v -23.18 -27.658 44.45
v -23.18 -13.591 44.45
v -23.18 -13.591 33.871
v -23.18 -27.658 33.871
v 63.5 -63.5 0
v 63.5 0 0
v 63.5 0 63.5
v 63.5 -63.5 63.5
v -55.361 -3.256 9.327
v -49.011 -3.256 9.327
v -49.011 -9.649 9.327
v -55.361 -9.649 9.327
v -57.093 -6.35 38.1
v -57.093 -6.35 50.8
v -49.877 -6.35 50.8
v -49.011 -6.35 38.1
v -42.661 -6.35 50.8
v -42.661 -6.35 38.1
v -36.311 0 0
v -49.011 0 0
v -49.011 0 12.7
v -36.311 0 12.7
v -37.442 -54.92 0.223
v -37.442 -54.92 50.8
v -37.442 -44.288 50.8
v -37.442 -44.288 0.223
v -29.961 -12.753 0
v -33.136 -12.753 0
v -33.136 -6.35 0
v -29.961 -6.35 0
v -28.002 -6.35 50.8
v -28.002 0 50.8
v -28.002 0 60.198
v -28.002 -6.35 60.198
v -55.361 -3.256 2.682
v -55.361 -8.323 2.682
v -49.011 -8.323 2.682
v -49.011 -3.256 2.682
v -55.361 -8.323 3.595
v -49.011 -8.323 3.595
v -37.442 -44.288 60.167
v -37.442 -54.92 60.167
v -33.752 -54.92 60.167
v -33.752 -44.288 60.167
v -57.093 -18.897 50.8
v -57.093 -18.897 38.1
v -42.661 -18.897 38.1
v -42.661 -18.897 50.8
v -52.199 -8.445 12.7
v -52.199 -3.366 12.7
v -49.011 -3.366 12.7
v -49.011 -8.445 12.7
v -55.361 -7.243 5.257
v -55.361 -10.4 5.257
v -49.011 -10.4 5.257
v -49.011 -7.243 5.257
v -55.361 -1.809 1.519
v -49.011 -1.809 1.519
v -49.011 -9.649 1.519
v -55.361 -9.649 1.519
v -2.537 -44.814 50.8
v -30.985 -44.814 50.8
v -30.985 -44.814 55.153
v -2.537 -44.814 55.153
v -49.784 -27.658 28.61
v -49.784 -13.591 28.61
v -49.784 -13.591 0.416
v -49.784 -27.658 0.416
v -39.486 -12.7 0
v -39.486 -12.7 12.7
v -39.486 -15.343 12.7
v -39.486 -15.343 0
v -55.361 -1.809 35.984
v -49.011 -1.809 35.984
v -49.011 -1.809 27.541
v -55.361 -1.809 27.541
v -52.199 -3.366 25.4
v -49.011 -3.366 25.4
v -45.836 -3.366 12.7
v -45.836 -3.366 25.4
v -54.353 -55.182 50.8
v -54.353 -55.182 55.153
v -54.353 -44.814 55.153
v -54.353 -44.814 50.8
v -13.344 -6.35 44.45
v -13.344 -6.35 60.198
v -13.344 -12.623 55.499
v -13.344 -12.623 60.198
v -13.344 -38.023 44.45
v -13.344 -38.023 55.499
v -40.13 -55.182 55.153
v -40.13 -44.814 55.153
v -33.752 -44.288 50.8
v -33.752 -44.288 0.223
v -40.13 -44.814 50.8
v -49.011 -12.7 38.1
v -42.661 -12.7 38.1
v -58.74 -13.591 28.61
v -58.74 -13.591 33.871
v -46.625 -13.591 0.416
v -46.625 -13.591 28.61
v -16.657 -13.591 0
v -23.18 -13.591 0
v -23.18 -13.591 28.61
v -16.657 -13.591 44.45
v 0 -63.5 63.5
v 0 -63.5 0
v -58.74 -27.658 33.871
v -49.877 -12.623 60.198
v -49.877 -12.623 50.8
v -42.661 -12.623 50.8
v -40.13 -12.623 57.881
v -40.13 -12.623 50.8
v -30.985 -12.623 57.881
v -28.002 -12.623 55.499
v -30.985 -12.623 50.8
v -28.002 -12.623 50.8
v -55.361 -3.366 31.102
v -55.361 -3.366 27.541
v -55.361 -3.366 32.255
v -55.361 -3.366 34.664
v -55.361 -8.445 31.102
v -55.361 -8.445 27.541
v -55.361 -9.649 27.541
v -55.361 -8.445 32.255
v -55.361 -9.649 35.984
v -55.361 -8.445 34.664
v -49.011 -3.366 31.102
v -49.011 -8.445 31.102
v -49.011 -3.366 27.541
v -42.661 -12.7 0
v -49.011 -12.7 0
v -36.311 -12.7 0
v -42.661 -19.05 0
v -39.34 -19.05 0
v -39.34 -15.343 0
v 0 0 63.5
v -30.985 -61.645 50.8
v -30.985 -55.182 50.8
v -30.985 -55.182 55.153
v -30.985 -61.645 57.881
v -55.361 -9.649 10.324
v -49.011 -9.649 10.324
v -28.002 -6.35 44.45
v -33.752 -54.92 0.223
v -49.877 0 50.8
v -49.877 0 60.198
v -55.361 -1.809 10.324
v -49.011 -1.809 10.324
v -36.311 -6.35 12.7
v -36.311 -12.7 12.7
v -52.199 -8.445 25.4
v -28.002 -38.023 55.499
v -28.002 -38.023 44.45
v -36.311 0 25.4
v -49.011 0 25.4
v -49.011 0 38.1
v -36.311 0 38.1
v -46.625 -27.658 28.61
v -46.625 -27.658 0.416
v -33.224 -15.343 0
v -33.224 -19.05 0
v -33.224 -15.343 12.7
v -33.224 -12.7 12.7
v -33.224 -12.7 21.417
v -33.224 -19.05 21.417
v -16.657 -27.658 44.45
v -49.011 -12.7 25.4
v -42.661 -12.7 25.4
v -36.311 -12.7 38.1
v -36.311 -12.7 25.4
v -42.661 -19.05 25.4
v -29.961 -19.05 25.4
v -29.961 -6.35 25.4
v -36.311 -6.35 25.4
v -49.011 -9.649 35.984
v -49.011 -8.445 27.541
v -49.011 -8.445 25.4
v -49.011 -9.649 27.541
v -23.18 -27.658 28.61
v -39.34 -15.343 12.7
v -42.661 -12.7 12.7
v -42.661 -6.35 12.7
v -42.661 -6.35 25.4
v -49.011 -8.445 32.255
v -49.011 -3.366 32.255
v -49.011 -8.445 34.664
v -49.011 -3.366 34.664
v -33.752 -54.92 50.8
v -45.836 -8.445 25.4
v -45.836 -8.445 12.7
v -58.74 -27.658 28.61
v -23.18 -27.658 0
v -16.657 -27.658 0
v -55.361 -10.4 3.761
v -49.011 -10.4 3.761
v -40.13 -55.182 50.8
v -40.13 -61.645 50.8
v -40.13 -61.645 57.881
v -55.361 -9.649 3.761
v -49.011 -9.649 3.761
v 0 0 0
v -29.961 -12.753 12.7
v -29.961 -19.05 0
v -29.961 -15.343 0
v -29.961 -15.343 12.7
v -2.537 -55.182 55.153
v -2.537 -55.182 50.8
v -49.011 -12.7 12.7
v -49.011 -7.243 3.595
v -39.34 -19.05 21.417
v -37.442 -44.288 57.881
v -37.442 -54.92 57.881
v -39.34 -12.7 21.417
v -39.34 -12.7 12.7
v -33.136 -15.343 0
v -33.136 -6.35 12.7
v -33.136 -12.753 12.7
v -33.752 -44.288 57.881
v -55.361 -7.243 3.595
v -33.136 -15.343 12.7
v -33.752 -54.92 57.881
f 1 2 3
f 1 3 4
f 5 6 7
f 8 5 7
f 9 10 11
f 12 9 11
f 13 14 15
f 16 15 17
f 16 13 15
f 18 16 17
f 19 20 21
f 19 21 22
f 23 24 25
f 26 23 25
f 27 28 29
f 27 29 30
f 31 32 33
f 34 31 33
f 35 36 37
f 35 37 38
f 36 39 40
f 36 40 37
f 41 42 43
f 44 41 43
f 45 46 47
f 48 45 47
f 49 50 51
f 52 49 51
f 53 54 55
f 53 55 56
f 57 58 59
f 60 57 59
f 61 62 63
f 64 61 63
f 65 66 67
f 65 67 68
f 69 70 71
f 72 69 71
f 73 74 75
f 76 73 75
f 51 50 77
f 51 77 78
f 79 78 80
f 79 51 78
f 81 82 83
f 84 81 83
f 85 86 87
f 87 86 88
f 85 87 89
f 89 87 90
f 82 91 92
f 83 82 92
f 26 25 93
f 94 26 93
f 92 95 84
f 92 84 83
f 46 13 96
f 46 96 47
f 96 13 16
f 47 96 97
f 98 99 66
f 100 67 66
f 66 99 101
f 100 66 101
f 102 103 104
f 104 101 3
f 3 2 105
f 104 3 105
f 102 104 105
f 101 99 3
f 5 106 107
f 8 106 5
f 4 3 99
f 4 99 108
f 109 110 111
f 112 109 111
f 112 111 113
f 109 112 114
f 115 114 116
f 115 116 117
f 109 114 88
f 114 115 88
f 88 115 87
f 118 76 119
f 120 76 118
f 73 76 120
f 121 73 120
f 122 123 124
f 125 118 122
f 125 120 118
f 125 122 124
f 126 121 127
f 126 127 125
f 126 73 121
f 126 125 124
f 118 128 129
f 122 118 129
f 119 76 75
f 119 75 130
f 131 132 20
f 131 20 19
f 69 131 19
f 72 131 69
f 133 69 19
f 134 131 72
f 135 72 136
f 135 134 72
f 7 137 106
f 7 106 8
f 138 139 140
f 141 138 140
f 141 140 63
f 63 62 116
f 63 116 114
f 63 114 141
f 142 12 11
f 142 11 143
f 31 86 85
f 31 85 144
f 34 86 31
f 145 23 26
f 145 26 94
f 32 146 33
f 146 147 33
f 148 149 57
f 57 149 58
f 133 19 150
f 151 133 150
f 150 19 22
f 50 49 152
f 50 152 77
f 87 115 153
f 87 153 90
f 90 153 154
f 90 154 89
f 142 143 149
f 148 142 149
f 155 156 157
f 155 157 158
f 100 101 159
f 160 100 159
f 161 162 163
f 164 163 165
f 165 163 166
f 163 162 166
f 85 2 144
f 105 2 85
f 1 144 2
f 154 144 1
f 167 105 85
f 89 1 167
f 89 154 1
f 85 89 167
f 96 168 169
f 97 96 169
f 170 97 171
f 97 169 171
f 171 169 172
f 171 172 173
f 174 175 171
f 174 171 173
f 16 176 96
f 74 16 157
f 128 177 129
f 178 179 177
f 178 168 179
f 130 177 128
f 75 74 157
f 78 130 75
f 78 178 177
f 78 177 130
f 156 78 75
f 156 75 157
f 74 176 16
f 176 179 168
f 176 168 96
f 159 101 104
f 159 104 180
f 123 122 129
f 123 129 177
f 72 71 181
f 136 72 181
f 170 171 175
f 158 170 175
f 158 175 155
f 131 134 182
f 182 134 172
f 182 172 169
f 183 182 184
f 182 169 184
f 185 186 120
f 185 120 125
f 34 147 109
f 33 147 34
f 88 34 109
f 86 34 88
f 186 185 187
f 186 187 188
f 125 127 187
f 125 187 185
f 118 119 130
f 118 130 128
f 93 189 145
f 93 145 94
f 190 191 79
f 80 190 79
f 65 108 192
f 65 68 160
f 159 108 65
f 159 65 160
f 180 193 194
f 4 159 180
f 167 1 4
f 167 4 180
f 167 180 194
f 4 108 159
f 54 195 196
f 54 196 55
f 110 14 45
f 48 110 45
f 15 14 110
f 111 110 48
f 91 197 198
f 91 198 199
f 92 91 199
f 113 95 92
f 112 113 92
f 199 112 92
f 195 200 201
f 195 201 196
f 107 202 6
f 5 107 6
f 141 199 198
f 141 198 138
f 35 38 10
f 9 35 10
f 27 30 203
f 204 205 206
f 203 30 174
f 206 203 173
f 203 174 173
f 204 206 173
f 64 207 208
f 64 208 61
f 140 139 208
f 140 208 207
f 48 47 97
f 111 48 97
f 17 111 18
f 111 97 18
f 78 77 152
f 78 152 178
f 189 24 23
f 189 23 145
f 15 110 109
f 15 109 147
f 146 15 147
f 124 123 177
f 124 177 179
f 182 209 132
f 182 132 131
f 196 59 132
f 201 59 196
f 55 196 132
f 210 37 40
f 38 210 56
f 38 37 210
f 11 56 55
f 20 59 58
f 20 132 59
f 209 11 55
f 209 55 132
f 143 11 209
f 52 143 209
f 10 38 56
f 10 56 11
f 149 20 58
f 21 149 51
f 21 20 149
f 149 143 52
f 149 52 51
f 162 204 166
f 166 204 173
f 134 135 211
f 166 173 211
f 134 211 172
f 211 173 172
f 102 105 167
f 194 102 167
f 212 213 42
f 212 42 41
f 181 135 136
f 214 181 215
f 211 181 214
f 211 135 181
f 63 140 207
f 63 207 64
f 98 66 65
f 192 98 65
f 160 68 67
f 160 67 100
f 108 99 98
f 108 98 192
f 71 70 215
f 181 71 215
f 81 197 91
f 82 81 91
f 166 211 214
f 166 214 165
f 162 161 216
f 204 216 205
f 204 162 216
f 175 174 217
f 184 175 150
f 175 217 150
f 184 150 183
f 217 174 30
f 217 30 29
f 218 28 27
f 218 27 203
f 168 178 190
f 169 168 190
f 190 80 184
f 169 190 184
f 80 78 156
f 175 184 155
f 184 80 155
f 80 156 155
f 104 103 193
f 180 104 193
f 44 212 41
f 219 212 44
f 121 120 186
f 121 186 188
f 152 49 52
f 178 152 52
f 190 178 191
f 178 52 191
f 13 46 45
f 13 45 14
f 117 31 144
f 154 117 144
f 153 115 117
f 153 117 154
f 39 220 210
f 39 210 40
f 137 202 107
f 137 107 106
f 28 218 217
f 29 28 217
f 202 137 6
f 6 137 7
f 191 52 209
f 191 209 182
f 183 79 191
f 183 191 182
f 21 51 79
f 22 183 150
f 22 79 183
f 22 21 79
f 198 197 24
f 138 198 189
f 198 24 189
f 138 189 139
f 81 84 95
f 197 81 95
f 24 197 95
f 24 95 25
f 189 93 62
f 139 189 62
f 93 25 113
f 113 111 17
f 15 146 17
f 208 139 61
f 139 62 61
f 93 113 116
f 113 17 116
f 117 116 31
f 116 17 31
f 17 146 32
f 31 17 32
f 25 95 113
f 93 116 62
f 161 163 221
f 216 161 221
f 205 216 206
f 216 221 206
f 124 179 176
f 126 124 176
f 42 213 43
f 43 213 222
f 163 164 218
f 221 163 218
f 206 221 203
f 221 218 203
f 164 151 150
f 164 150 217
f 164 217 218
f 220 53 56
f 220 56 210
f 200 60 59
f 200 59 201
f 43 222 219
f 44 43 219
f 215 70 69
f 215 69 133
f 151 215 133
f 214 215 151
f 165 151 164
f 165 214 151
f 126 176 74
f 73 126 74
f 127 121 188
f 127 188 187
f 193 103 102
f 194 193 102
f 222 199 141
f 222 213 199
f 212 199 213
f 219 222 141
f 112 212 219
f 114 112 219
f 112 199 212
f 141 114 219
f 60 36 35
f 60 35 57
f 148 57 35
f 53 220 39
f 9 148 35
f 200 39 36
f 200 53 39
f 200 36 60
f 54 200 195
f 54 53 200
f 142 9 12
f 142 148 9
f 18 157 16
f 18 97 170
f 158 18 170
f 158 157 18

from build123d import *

# Parameters (mm, degrees)
F0_W      = 63.5
F0_H      = 63.5
F1_DEPTH  = 63.5
F2_W      = 12.7
F2_H      = 12.7
F3_DEPTH  = 12.7
F4_W      = 6.35
F4_H      = 6.35
F5_DEPTH  = 12.7
F6_W      = 12.7
F6_H      = 12.7
F7_DEPTH  = 12.7
F8_W      = 6.3622790834
F8_H      = 5.0781101454
F9_DEPTH  = 12.7
F11_DEPTH = 12.7
F12_W     = 6.1163902283
F12_H     = 21.417343989
F13_DEPTH = 6.35
F14_W     = 2.5899494067
F14_H     = 12.7
F15_DEPTH = 6.35
F16_W     = 14.4312972566
F16_H     = 12.5468349248
F17_DEPTH = 12.7
F18_W     = 36.5332050999
F18_H     = 12.6234174624
F19_DEPTH = 9.398
F20_W     = 14.6587782358
F20_H     = 4.699
F21_DEPTH = 25.4
F22_W     = 14.6587782358
F22_H     = 38.0234174624
F23_DEPTH = 6.35
F24_W     = 14.6587782358
F24_H     = 15.748
F25_DEPTH = 6.35
F26_W     = 6.5230224282
F26_H     = 14.0668489039
F27_DEPTH = 44.45
F28_W     = 14.0668489039
F28_H     = 5.2612107247
F29_DEPTH = 35.56
F30_W     = 3.1590871513
F30_H     = 14.0668489039
F31_DEPTH = 28.194
F32_W     = 9.145732969
F32_H     = 7.0805729747
F33_DEPTH = 49.022
F34_W     = 10.367654264
F34_H     = 4.3525428891
F35_DEPTH = 28.448
F36_DEPTH = 23.368
F37_W     = 3.690186888
F37_H     = 10.6312707067
F38_DEPTH = 2.286
F39_DEPTH = 57.658
F40_W     = 5.0781101454
F40_H     = 1.1522667482
F41_DEPTH = 6.35


with BuildPart() as f1:
    # F0 (on Front) → F1 (new body)
    with BuildSketch(Plane.XZ):
        with Locations((31.75, 31.75)):
            Rectangle(F0_W, F0_H)
    extrude(amount=F1_DEPTH)


with BuildPart() as f3:
    # F2 (on Front) → F3 (new body)
    with BuildSketch(Plane.XZ):
        with Locations((-42.6612650613, 6.35)):
            Rectangle(F2_W, F2_H)
    extrude(amount=F3_DEPTH)

    # F4 (on face) → F5 (join)
    with BuildSketch(Plane.XY.offset(12.7)):
        with Locations((-39.4862650613, -9.525)):
            Rectangle(F4_W, F4_H)
        Polygon((-29.9612650613, -6.35), (-36.3112650613, -6.35), (-36.3112650613, -12.7), (-42.6612650613, -12.7), (-42.6612650613, -19.05), (-29.9612650613, -19.05), align=None)
    extrude(amount=F5_DEPTH)

    # F6 (on face) → F7 (join)
    with BuildSketch(Plane.XY.offset(25.4)):
        with Locations((-42.6612650613, -6.35)):
            Rectangle(F6_W, F6_H)
    extrude(amount=F7_DEPTH)

    # F8 (on face) → F9 (join)
    with BuildSketch(Plane.XY.offset(12.7)):
        with Locations((-49.0174046029, -5.9054897865)):
            Rectangle(F8_W, F8_H)
    extrude(amount=F9_DEPTH)

    # F10 (on face) → F11 (join)
    with BuildSketch(Plane(origin=(0, 0, 12.7), x_dir=(1, 0, 0), z_dir=(0, 0, -1))):
        Polygon((-42.6612650613, 12.7), (-39.4862650613, 12.7), (-39.4862650613, 15.3430420905), (-33.1362650613, 15.3430420905), (-33.1362650613, 6.35), (-29.9612650613, 6.35), (-29.9612650613, 19.05), (-42.6612650613, 19.05), align=None)
    extrude(amount=F11_DEPTH)

    # F12 (on face) → F13 (cut)
    with BuildSketch(Plane.XZ.offset(19.05)):
        with Locations((-36.2820141017, 10.7086719945)):
            Rectangle(F12_W, F12_H)
    extrude(amount=-F13_DEPTH, mode=Mode.SUBTRACT)

    # F14 (on face) → F15 (cut)
    with BuildSketch(Plane(origin=(-33.1362650613, 0, 0), x_dir=(0, -1, 0), z_dir=(-1, 0, 0))):
        with Locations((14.0480673872, 6.35)):
            Rectangle(F14_W, F14_H)
    extrude(amount=-F15_DEPTH, mode=Mode.SUBTRACT)

    # F16 (on face) → F17 (join)
    with BuildSketch(Plane.XY.offset(38.1)):
        with Locations((-49.8769136895, -12.6234174624)):
            Rectangle(F16_W, F16_H)
    extrude(amount=F17_DEPTH)

    # F18 (on face) → F19 (join)
    with BuildSketch(Plane.XY.offset(50.8)):
        with Locations((-31.6103111396, -6.3117087312)):
            Rectangle(F18_W, F18_H)
    extrude(amount=F19_DEPTH)

    # F20 (on face) → F21 (join)
    with BuildSketch(Plane.XZ.offset(12.6234174624)):
        with Locations((-20.6730977076, 53.1495)):
            Rectangle(F20_W, F20_H)
    extrude(amount=F21_DEPTH)

    # F22 (on face) → F23 (join)
    with BuildSketch(Plane(origin=(0, 0, 50.8), x_dir=(1, 0, 0), z_dir=(0, 0, -1))):
        with Locations((-20.6730977076, 19.0117087312)):
            Rectangle(F22_W, F22_H)
    extrude(amount=F23_DEPTH)

    # F24 (on face) → F25 (cut)
    with BuildSketch(Plane(origin=(0, 0, 0), x_dir=(-1, 0, 0), z_dir=(0, 1, 0))):
        with Locations((20.6730977076, 52.324)):
            Rectangle(F24_W, F24_H)
    extrude(amount=-F25_DEPTH, mode=Mode.SUBTRACT)

    # F26 (on face) → F27 (join)
    with BuildSketch(Plane(origin=(0, 0, 44.45), x_dir=(1, 0, 0), z_dir=(0, 0, -1))):
        with Locations((-19.9186382815, 20.6244029105)):
            Rectangle(F26_W, F26_H)
    extrude(amount=F27_DEPTH)

    # F28 (on face) → F29 (join)
    with BuildSketch(Plane(origin=(-23.1801494956, 0, 0), x_dir=(0, -1, 0), z_dir=(-1, 0, 0))):
        with Locations((20.6244029105, 31.2403859571)):
            Rectangle(F28_W, F28_H)
    extrude(amount=F29_DEPTH)

    # F30 (on face) → F31 (join)
    with BuildSketch(Plane(origin=(0, 0, 28.6097805947), x_dir=(1, 0, 0), z_dir=(0, 0, -1))):
        with Locations((-48.2048373669, 20.6244029105)):
            Rectangle(F30_W, F30_H)
    extrude(amount=F31_DEPTH)

    # F32 (on face) → F33 (join)
    with BuildSketch(Plane.XZ.offset(12.6234174624)):
        with Locations((-35.5574879795, 54.3402864873)):
            Rectangle(F32_W, F32_H)
    extrude(amount=F33_DEPTH)

    # F34 (on face) → F35 (join)
    with BuildSketch(Plane.YZ.offset(-30.984621495)):
        with Locations((-49.9979630113, 52.9762714446)):
            Rectangle(F34_W, F34_H)
    extrude(amount=F35_DEPTH)

    # F34 (on face) → F36 (join)
    with BuildSketch(Plane.YZ.offset(-30.984621495)):
        with Locations((-49.9979630113, 52.9762714446)):
            Rectangle(F34_W, F34_H)
    extrude(amount=-F36_DEPTH)

    # F37 (on face) → F38 (join)
    with BuildSketch(Plane.XY.offset(57.8805729747)):
        with Locations((-35.597005859, -49.603946507)):
            Rectangle(F37_W, F37_H)
    extrude(amount=F38_DEPTH)

    # F37 (on face) → F39 (join)
    with BuildSketch(Plane.XY.offset(57.8805729747)):
        with Locations((-35.597005859, -49.603946507)):
            Rectangle(F37_W, F37_H)
    extrude(amount=-F39_DEPTH)

    # F40 (on face) → F41 (join)
    with BuildSketch(Plane(origin=(-49.0112650613, 0, 0), x_dir=(0, -1, 0), z_dir=(-1, 0, 0))):
        Polygon((1.809271751, 35.9843969345), (1.809271751, 27.5411326438), (3.3664347138, 27.5411326438), (3.3664347138, 31.1024514958), (3.3664347138, 32.2547182441), (3.3664347138, 34.6637703478), (8.4445448592, 34.6637703478), (8.4445448592, 32.2547182441), (8.4445448592, 31.1024514958), (8.4445448592, 27.5411326438), (9.6494471654, 27.5411326438), (9.6494471654, 35.9843969345), align=None)
        with Locations((5.9054897865, 31.67858487)):
            Rectangle(F40_W, F40_H)
        Polygon((9.6494471654, 9.327202104), (9.6494471654, 10.3240506724), (1.809271751, 10.3240506724), (1.809271751, 1.5185547527), (9.6494471654, 1.5185547527), (9.6494471654, 3.7614635658), (10.3999143466, 3.7614635658), (10.3999143466, 5.2567371167), (7.2432272136, 5.2567371167), (7.2432272136, 3.5953223705), (8.3231469616, 3.5953223705), (8.3231469616, 2.6815442834), (3.2558327075, 2.6815442834), (3.2558327075, 9.327202104), align=None)
    extrude(amount=F41_DEPTH)


solid = Compound([f1.part, f3.part])
